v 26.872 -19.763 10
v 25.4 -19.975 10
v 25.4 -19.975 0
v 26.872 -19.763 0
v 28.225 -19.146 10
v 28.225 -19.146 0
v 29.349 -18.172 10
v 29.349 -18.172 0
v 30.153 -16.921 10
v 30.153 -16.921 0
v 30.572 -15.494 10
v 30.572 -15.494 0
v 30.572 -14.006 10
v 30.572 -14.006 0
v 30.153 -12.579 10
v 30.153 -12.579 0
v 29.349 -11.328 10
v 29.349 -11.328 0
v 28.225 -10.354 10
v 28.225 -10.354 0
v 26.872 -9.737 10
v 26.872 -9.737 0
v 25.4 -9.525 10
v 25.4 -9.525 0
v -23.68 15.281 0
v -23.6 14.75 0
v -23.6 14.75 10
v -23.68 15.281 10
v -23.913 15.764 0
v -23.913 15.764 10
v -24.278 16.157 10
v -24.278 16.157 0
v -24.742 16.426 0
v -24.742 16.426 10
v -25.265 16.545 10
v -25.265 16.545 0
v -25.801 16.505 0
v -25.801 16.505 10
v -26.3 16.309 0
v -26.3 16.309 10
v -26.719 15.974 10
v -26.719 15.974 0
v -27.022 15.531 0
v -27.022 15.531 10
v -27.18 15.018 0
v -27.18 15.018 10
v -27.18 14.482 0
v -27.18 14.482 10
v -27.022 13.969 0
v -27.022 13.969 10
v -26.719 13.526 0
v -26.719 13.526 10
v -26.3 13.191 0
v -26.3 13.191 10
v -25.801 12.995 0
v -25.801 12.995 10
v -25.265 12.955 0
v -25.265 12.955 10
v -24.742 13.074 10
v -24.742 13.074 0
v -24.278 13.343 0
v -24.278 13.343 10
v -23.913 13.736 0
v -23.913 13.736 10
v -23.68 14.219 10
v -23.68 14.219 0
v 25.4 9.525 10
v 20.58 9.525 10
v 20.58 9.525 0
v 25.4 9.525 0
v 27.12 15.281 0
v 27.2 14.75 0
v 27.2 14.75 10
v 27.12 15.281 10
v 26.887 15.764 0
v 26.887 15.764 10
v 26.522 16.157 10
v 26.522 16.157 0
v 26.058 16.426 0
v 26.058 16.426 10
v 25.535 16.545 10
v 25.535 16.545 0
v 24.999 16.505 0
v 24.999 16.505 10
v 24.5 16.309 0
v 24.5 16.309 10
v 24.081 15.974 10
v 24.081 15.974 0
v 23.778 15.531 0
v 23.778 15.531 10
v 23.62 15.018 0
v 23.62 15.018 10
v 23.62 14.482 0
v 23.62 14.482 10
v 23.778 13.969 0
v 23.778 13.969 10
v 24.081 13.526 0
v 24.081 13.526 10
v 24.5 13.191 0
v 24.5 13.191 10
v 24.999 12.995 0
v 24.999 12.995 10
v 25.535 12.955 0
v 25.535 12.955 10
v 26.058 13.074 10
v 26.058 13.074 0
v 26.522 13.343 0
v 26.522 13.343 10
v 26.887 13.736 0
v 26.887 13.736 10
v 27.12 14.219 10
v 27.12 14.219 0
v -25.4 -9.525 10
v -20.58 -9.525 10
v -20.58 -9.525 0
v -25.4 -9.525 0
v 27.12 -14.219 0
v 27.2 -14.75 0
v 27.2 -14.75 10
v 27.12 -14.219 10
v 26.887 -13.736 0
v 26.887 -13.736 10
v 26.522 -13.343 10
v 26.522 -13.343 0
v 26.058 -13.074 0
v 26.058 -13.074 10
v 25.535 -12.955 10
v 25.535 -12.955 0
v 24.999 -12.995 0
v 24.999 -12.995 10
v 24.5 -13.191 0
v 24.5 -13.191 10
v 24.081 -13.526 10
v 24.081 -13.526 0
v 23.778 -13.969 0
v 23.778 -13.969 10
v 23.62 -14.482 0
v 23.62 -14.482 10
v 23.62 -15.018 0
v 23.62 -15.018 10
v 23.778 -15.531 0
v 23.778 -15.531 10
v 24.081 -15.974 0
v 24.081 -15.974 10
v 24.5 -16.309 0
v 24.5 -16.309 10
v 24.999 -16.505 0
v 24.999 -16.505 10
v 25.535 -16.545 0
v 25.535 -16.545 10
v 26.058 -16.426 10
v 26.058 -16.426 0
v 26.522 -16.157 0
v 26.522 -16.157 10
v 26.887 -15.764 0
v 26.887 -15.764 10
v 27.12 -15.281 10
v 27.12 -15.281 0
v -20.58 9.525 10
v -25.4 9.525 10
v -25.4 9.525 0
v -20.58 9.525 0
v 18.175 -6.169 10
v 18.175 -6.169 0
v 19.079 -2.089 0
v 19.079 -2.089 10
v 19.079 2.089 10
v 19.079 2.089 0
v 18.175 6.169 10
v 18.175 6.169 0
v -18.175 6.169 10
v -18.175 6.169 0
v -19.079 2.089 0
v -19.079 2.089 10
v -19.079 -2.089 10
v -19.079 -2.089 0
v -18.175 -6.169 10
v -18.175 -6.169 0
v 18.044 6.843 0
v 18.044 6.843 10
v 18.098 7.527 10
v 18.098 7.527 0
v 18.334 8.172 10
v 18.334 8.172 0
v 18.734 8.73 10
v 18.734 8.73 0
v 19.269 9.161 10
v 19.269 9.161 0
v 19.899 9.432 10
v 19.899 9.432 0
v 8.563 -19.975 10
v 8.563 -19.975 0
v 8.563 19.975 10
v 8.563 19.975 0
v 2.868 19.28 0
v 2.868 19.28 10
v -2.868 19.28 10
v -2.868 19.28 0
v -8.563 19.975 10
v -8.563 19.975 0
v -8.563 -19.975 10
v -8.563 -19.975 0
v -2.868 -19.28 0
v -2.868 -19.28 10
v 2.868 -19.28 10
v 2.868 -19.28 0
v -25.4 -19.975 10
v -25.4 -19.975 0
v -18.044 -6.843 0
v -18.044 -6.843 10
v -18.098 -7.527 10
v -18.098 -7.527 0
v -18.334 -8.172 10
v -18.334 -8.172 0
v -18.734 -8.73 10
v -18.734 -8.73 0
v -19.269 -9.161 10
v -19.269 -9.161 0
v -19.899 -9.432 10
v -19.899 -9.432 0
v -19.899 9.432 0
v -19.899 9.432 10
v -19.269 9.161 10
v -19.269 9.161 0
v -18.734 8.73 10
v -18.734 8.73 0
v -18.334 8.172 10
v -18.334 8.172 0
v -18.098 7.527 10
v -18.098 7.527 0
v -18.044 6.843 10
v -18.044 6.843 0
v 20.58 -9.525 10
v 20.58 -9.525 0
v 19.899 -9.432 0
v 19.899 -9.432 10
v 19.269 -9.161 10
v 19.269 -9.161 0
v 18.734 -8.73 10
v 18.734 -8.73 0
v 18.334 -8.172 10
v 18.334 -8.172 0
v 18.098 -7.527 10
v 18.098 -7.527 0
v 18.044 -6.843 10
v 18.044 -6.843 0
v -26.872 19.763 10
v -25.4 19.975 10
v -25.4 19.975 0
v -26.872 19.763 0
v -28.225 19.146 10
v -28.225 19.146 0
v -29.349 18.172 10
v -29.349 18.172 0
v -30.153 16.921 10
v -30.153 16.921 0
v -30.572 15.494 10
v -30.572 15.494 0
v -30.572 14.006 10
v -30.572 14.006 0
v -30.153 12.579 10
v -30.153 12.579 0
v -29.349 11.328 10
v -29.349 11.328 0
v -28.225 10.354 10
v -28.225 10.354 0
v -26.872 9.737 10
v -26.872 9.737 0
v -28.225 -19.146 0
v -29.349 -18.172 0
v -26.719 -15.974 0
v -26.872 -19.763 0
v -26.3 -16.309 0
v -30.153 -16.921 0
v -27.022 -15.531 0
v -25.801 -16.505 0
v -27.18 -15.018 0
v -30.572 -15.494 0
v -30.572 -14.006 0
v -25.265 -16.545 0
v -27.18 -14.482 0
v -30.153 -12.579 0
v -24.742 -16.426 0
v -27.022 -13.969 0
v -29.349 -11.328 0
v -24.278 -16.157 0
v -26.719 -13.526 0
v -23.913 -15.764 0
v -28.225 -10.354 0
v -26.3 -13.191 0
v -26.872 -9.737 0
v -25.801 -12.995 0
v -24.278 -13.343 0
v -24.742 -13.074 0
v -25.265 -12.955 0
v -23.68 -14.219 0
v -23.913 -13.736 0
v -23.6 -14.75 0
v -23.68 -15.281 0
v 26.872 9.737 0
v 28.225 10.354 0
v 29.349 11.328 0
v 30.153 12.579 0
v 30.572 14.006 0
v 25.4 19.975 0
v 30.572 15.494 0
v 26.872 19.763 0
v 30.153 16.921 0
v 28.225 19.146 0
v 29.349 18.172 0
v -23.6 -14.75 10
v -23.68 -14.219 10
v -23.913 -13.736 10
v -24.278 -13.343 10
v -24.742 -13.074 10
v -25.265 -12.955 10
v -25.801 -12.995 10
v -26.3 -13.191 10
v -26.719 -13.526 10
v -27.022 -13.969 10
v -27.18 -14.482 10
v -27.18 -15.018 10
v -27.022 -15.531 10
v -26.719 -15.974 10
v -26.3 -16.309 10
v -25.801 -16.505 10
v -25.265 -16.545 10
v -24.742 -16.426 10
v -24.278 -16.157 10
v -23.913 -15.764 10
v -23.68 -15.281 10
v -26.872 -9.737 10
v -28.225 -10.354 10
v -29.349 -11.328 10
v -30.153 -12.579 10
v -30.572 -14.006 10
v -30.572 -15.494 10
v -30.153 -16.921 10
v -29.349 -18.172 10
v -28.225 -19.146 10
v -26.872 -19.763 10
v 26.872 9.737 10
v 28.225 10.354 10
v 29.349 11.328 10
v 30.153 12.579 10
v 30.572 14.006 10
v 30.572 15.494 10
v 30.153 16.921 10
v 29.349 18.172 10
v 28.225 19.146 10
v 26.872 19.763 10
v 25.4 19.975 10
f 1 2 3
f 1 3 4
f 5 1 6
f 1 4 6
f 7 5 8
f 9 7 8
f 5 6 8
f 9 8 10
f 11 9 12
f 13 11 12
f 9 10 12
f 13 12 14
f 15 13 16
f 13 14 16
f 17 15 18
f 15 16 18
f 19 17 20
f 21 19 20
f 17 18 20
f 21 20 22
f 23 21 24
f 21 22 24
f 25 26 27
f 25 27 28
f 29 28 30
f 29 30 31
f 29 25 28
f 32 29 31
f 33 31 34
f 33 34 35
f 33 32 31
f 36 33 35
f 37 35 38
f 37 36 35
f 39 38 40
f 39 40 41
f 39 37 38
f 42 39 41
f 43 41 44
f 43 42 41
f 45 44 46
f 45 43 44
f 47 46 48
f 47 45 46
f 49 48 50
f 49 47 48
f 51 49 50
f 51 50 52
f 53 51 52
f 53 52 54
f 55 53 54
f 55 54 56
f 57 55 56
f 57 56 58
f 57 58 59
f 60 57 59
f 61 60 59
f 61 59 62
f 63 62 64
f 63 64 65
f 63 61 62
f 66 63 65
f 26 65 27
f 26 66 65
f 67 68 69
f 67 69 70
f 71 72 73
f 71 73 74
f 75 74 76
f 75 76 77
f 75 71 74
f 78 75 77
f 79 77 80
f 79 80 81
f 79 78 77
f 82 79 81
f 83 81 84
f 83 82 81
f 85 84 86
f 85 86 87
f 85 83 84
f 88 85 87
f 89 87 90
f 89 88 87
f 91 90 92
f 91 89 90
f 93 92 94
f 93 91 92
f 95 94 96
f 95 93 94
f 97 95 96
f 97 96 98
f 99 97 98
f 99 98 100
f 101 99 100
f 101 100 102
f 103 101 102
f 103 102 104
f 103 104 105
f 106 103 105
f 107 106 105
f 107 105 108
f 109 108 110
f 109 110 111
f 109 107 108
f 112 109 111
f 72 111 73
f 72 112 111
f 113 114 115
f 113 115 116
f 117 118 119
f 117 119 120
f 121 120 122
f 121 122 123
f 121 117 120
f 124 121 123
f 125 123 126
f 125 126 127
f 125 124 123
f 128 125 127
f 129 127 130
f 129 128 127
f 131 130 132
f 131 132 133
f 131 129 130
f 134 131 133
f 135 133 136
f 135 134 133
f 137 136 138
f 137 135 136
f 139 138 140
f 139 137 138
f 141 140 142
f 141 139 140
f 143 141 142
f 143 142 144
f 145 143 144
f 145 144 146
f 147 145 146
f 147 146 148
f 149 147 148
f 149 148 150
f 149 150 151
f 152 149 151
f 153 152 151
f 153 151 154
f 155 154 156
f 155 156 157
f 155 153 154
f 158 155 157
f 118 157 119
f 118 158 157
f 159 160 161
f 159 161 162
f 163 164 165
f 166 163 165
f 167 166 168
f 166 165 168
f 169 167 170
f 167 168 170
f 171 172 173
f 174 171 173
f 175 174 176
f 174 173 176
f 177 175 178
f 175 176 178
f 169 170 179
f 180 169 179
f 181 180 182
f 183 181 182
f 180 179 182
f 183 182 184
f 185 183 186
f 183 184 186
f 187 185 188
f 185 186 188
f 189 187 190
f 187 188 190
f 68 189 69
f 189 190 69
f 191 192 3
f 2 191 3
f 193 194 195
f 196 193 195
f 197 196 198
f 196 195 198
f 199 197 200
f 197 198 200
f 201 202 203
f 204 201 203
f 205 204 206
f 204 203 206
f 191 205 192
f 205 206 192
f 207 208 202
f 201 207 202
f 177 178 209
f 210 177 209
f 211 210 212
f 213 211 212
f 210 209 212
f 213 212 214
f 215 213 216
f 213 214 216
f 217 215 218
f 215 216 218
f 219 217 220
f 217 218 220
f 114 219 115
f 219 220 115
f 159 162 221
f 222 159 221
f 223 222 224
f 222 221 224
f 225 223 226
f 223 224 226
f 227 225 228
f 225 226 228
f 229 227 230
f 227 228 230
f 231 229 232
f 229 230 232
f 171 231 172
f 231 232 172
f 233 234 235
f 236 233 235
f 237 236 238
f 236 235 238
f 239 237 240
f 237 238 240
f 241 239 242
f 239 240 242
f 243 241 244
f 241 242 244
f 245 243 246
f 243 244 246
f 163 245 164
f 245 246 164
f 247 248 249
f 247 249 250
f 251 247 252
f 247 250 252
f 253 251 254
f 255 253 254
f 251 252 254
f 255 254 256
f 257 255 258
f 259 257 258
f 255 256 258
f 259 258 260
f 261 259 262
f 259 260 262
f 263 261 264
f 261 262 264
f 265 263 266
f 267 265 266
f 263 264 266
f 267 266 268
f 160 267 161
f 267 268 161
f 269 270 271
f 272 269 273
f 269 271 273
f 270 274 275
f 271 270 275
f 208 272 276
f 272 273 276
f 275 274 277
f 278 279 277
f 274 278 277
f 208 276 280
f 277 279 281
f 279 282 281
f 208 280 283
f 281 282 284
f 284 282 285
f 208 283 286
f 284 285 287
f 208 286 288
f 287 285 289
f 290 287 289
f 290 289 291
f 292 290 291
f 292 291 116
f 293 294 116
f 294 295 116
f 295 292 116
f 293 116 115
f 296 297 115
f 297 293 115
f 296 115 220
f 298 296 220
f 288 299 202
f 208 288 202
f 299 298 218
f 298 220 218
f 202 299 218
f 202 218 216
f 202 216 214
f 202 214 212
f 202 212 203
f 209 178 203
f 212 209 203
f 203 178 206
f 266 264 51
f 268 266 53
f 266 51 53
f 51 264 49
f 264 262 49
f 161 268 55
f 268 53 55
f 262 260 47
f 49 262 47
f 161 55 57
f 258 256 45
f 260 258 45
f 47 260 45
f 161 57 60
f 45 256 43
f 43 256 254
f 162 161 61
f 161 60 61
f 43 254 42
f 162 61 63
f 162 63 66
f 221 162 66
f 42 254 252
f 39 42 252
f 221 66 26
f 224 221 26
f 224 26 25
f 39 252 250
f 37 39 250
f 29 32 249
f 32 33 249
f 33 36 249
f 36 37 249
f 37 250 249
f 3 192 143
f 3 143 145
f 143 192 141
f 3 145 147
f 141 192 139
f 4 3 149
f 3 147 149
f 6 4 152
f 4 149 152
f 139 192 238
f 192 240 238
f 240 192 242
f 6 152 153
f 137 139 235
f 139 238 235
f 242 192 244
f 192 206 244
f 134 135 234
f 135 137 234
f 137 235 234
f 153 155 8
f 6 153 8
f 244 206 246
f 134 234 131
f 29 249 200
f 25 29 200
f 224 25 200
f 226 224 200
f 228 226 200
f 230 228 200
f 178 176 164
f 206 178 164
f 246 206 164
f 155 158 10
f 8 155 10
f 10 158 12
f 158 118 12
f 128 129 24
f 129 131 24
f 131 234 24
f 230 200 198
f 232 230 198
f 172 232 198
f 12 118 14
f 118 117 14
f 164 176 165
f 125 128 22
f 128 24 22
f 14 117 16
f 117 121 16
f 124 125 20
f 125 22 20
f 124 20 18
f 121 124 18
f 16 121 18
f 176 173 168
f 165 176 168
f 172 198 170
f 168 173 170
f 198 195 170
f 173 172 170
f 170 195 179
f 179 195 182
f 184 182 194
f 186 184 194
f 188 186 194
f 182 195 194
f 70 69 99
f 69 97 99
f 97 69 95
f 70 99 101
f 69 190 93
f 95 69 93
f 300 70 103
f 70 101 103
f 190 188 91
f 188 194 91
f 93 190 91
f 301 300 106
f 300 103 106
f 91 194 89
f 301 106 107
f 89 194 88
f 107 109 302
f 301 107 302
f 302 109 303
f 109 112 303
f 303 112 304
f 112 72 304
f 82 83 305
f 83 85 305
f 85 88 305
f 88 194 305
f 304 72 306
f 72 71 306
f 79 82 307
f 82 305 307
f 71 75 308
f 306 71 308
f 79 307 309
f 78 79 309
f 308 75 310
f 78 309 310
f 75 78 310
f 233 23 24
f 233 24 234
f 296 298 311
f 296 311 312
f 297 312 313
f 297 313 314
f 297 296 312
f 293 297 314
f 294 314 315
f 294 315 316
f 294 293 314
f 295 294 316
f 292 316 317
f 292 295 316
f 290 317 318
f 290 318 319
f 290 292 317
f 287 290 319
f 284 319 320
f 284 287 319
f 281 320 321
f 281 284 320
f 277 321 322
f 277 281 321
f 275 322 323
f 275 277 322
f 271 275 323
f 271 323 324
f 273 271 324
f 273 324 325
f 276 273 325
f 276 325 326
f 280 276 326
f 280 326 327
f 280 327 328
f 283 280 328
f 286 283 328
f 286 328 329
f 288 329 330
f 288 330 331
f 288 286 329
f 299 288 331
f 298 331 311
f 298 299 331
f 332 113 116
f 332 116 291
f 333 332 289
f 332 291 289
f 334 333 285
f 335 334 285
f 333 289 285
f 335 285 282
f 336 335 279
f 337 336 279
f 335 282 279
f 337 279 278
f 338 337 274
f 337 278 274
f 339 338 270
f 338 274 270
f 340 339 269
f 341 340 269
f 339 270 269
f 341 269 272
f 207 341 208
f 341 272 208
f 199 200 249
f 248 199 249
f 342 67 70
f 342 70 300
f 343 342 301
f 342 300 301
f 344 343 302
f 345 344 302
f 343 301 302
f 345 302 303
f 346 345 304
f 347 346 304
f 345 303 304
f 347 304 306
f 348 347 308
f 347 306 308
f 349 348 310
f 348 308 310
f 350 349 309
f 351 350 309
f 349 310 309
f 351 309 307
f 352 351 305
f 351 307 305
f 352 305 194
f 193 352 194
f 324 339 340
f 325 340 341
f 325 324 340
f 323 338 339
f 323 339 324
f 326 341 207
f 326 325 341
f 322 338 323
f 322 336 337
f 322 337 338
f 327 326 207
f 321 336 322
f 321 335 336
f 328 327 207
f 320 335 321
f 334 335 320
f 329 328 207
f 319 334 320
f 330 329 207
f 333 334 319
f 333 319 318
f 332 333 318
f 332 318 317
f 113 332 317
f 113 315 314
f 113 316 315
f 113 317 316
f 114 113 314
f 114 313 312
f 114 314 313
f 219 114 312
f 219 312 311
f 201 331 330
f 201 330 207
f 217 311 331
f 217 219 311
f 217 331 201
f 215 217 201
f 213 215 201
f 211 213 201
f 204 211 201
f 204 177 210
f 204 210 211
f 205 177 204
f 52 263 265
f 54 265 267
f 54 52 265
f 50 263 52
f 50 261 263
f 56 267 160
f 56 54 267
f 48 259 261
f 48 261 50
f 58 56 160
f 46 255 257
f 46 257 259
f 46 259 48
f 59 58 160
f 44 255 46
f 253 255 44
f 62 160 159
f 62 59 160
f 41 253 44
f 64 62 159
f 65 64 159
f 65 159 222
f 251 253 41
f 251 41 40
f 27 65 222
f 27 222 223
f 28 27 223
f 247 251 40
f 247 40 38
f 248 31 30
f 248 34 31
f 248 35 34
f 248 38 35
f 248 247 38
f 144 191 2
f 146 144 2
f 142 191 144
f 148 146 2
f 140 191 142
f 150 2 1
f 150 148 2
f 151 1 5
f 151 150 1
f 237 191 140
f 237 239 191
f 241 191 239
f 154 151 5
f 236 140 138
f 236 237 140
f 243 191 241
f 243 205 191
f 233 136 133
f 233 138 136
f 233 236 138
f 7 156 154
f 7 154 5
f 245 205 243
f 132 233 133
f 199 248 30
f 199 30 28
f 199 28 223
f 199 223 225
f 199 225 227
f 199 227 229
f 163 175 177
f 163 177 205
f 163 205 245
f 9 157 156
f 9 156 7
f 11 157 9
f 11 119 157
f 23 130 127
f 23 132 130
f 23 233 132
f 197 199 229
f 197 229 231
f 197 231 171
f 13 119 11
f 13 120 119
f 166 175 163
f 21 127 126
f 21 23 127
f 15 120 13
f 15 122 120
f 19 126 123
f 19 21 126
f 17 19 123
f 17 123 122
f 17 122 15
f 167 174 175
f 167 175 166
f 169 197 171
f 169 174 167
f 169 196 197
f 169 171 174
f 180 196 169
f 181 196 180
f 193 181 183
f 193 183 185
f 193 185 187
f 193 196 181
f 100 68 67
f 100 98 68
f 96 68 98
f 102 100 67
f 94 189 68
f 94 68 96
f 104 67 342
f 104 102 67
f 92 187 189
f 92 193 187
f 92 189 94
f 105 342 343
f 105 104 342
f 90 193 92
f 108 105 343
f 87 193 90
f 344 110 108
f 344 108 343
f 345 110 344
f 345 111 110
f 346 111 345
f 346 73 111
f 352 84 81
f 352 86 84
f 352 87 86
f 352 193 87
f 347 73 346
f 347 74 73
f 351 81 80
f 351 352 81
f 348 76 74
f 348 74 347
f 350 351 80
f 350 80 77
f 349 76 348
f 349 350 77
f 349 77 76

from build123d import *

# Parameters (mm, degrees)
SKETCH1_R           = 1.8
BOSS_EXTRUDE1_DEPTH = 10


with BuildPart() as part:
    # Sketch1 → Boss-Extrude1 (new body)
    with BuildSketch(Plane.XY):
        with BuildLine():
            Line((8.562572408, -19.9749896), (25.4, -19.9749896))
            ThreePointArc((25.4, -19.9749896), (30.6249948, -14.7499948), (25.4, -9.525))
            Line((25.4, -9.525), (20.579786947, -9.525))
            ThreePointArc((20.579786947, -9.525), (18.515185258, -8.464533666), (18.174552534, -6.168637692))
            ThreePointArc((18.174552534, -6.168637692), (19.192875, 0), (18.174552534, 6.168637692))
            ThreePointArc((18.174552534, 6.168637692), (18.515185258, 8.464533666), (20.579786947, 9.525))
            Line((20.579786947, 9.525), (25.4, 9.525))
            ThreePointArc((25.4, 9.525), (30.6249948, 14.7499948), (25.4, 19.9749896))
            Line((25.4, 19.9749896), (8.562572408, 19.9749896))
            ThreePointArc((8.562572408, 19.9749896), (0, 19.192875), (-8.562572408, 19.9749896))
            Line((-8.562572408, 19.9749896), (-25.4, 19.9749896))
            ThreePointArc((-25.4, 19.9749896), (-30.6249948, 14.7499948), (-25.4, 9.525))
            Line((-25.4, 9.525), (-20.579786947, 9.525))
            ThreePointArc((-20.579786947, 9.525), (-18.515185258, 8.464533666), (-18.174552534, 6.168637692))
            ThreePointArc((-18.174552534, 6.168637692), (-19.192875, 0), (-18.174552534, -6.168637692))
            ThreePointArc((-18.174552534, -6.168637692), (-18.515185258, -8.464533666), (-20.579786947, -9.525))
            Line((-20.579786947, -9.525), (-25.4, -9.525))
            ThreePointArc((-25.4, -9.525), (-30.6249948, -14.7499948), (-25.4, -19.9749896))
            Line((-25.4, -19.9749896), (-8.562572408, -19.9749896))
            ThreePointArc((-8.562572408, -19.9749896), (0, -19.192875), (8.562572408, -19.9749896))
        make_face()
        with Locations((-25.4, 14.7499948)):
            Circle(SKETCH1_R, mode=Mode.SUBTRACT)
        with Locations((-25.4, -14.7499948)):
            Circle(SKETCH1_R, mode=Mode.SUBTRACT)
        with Locations((25.4, -14.7499948)):
            Circle(SKETCH1_R, mode=Mode.SUBTRACT)
        with Locations((25.4, 14.7499948)):
            Circle(SKETCH1_R, mode=Mode.SUBTRACT)
    extrude(amount=BOSS_EXTRUDE1_DEPTH)


solid = part.part
